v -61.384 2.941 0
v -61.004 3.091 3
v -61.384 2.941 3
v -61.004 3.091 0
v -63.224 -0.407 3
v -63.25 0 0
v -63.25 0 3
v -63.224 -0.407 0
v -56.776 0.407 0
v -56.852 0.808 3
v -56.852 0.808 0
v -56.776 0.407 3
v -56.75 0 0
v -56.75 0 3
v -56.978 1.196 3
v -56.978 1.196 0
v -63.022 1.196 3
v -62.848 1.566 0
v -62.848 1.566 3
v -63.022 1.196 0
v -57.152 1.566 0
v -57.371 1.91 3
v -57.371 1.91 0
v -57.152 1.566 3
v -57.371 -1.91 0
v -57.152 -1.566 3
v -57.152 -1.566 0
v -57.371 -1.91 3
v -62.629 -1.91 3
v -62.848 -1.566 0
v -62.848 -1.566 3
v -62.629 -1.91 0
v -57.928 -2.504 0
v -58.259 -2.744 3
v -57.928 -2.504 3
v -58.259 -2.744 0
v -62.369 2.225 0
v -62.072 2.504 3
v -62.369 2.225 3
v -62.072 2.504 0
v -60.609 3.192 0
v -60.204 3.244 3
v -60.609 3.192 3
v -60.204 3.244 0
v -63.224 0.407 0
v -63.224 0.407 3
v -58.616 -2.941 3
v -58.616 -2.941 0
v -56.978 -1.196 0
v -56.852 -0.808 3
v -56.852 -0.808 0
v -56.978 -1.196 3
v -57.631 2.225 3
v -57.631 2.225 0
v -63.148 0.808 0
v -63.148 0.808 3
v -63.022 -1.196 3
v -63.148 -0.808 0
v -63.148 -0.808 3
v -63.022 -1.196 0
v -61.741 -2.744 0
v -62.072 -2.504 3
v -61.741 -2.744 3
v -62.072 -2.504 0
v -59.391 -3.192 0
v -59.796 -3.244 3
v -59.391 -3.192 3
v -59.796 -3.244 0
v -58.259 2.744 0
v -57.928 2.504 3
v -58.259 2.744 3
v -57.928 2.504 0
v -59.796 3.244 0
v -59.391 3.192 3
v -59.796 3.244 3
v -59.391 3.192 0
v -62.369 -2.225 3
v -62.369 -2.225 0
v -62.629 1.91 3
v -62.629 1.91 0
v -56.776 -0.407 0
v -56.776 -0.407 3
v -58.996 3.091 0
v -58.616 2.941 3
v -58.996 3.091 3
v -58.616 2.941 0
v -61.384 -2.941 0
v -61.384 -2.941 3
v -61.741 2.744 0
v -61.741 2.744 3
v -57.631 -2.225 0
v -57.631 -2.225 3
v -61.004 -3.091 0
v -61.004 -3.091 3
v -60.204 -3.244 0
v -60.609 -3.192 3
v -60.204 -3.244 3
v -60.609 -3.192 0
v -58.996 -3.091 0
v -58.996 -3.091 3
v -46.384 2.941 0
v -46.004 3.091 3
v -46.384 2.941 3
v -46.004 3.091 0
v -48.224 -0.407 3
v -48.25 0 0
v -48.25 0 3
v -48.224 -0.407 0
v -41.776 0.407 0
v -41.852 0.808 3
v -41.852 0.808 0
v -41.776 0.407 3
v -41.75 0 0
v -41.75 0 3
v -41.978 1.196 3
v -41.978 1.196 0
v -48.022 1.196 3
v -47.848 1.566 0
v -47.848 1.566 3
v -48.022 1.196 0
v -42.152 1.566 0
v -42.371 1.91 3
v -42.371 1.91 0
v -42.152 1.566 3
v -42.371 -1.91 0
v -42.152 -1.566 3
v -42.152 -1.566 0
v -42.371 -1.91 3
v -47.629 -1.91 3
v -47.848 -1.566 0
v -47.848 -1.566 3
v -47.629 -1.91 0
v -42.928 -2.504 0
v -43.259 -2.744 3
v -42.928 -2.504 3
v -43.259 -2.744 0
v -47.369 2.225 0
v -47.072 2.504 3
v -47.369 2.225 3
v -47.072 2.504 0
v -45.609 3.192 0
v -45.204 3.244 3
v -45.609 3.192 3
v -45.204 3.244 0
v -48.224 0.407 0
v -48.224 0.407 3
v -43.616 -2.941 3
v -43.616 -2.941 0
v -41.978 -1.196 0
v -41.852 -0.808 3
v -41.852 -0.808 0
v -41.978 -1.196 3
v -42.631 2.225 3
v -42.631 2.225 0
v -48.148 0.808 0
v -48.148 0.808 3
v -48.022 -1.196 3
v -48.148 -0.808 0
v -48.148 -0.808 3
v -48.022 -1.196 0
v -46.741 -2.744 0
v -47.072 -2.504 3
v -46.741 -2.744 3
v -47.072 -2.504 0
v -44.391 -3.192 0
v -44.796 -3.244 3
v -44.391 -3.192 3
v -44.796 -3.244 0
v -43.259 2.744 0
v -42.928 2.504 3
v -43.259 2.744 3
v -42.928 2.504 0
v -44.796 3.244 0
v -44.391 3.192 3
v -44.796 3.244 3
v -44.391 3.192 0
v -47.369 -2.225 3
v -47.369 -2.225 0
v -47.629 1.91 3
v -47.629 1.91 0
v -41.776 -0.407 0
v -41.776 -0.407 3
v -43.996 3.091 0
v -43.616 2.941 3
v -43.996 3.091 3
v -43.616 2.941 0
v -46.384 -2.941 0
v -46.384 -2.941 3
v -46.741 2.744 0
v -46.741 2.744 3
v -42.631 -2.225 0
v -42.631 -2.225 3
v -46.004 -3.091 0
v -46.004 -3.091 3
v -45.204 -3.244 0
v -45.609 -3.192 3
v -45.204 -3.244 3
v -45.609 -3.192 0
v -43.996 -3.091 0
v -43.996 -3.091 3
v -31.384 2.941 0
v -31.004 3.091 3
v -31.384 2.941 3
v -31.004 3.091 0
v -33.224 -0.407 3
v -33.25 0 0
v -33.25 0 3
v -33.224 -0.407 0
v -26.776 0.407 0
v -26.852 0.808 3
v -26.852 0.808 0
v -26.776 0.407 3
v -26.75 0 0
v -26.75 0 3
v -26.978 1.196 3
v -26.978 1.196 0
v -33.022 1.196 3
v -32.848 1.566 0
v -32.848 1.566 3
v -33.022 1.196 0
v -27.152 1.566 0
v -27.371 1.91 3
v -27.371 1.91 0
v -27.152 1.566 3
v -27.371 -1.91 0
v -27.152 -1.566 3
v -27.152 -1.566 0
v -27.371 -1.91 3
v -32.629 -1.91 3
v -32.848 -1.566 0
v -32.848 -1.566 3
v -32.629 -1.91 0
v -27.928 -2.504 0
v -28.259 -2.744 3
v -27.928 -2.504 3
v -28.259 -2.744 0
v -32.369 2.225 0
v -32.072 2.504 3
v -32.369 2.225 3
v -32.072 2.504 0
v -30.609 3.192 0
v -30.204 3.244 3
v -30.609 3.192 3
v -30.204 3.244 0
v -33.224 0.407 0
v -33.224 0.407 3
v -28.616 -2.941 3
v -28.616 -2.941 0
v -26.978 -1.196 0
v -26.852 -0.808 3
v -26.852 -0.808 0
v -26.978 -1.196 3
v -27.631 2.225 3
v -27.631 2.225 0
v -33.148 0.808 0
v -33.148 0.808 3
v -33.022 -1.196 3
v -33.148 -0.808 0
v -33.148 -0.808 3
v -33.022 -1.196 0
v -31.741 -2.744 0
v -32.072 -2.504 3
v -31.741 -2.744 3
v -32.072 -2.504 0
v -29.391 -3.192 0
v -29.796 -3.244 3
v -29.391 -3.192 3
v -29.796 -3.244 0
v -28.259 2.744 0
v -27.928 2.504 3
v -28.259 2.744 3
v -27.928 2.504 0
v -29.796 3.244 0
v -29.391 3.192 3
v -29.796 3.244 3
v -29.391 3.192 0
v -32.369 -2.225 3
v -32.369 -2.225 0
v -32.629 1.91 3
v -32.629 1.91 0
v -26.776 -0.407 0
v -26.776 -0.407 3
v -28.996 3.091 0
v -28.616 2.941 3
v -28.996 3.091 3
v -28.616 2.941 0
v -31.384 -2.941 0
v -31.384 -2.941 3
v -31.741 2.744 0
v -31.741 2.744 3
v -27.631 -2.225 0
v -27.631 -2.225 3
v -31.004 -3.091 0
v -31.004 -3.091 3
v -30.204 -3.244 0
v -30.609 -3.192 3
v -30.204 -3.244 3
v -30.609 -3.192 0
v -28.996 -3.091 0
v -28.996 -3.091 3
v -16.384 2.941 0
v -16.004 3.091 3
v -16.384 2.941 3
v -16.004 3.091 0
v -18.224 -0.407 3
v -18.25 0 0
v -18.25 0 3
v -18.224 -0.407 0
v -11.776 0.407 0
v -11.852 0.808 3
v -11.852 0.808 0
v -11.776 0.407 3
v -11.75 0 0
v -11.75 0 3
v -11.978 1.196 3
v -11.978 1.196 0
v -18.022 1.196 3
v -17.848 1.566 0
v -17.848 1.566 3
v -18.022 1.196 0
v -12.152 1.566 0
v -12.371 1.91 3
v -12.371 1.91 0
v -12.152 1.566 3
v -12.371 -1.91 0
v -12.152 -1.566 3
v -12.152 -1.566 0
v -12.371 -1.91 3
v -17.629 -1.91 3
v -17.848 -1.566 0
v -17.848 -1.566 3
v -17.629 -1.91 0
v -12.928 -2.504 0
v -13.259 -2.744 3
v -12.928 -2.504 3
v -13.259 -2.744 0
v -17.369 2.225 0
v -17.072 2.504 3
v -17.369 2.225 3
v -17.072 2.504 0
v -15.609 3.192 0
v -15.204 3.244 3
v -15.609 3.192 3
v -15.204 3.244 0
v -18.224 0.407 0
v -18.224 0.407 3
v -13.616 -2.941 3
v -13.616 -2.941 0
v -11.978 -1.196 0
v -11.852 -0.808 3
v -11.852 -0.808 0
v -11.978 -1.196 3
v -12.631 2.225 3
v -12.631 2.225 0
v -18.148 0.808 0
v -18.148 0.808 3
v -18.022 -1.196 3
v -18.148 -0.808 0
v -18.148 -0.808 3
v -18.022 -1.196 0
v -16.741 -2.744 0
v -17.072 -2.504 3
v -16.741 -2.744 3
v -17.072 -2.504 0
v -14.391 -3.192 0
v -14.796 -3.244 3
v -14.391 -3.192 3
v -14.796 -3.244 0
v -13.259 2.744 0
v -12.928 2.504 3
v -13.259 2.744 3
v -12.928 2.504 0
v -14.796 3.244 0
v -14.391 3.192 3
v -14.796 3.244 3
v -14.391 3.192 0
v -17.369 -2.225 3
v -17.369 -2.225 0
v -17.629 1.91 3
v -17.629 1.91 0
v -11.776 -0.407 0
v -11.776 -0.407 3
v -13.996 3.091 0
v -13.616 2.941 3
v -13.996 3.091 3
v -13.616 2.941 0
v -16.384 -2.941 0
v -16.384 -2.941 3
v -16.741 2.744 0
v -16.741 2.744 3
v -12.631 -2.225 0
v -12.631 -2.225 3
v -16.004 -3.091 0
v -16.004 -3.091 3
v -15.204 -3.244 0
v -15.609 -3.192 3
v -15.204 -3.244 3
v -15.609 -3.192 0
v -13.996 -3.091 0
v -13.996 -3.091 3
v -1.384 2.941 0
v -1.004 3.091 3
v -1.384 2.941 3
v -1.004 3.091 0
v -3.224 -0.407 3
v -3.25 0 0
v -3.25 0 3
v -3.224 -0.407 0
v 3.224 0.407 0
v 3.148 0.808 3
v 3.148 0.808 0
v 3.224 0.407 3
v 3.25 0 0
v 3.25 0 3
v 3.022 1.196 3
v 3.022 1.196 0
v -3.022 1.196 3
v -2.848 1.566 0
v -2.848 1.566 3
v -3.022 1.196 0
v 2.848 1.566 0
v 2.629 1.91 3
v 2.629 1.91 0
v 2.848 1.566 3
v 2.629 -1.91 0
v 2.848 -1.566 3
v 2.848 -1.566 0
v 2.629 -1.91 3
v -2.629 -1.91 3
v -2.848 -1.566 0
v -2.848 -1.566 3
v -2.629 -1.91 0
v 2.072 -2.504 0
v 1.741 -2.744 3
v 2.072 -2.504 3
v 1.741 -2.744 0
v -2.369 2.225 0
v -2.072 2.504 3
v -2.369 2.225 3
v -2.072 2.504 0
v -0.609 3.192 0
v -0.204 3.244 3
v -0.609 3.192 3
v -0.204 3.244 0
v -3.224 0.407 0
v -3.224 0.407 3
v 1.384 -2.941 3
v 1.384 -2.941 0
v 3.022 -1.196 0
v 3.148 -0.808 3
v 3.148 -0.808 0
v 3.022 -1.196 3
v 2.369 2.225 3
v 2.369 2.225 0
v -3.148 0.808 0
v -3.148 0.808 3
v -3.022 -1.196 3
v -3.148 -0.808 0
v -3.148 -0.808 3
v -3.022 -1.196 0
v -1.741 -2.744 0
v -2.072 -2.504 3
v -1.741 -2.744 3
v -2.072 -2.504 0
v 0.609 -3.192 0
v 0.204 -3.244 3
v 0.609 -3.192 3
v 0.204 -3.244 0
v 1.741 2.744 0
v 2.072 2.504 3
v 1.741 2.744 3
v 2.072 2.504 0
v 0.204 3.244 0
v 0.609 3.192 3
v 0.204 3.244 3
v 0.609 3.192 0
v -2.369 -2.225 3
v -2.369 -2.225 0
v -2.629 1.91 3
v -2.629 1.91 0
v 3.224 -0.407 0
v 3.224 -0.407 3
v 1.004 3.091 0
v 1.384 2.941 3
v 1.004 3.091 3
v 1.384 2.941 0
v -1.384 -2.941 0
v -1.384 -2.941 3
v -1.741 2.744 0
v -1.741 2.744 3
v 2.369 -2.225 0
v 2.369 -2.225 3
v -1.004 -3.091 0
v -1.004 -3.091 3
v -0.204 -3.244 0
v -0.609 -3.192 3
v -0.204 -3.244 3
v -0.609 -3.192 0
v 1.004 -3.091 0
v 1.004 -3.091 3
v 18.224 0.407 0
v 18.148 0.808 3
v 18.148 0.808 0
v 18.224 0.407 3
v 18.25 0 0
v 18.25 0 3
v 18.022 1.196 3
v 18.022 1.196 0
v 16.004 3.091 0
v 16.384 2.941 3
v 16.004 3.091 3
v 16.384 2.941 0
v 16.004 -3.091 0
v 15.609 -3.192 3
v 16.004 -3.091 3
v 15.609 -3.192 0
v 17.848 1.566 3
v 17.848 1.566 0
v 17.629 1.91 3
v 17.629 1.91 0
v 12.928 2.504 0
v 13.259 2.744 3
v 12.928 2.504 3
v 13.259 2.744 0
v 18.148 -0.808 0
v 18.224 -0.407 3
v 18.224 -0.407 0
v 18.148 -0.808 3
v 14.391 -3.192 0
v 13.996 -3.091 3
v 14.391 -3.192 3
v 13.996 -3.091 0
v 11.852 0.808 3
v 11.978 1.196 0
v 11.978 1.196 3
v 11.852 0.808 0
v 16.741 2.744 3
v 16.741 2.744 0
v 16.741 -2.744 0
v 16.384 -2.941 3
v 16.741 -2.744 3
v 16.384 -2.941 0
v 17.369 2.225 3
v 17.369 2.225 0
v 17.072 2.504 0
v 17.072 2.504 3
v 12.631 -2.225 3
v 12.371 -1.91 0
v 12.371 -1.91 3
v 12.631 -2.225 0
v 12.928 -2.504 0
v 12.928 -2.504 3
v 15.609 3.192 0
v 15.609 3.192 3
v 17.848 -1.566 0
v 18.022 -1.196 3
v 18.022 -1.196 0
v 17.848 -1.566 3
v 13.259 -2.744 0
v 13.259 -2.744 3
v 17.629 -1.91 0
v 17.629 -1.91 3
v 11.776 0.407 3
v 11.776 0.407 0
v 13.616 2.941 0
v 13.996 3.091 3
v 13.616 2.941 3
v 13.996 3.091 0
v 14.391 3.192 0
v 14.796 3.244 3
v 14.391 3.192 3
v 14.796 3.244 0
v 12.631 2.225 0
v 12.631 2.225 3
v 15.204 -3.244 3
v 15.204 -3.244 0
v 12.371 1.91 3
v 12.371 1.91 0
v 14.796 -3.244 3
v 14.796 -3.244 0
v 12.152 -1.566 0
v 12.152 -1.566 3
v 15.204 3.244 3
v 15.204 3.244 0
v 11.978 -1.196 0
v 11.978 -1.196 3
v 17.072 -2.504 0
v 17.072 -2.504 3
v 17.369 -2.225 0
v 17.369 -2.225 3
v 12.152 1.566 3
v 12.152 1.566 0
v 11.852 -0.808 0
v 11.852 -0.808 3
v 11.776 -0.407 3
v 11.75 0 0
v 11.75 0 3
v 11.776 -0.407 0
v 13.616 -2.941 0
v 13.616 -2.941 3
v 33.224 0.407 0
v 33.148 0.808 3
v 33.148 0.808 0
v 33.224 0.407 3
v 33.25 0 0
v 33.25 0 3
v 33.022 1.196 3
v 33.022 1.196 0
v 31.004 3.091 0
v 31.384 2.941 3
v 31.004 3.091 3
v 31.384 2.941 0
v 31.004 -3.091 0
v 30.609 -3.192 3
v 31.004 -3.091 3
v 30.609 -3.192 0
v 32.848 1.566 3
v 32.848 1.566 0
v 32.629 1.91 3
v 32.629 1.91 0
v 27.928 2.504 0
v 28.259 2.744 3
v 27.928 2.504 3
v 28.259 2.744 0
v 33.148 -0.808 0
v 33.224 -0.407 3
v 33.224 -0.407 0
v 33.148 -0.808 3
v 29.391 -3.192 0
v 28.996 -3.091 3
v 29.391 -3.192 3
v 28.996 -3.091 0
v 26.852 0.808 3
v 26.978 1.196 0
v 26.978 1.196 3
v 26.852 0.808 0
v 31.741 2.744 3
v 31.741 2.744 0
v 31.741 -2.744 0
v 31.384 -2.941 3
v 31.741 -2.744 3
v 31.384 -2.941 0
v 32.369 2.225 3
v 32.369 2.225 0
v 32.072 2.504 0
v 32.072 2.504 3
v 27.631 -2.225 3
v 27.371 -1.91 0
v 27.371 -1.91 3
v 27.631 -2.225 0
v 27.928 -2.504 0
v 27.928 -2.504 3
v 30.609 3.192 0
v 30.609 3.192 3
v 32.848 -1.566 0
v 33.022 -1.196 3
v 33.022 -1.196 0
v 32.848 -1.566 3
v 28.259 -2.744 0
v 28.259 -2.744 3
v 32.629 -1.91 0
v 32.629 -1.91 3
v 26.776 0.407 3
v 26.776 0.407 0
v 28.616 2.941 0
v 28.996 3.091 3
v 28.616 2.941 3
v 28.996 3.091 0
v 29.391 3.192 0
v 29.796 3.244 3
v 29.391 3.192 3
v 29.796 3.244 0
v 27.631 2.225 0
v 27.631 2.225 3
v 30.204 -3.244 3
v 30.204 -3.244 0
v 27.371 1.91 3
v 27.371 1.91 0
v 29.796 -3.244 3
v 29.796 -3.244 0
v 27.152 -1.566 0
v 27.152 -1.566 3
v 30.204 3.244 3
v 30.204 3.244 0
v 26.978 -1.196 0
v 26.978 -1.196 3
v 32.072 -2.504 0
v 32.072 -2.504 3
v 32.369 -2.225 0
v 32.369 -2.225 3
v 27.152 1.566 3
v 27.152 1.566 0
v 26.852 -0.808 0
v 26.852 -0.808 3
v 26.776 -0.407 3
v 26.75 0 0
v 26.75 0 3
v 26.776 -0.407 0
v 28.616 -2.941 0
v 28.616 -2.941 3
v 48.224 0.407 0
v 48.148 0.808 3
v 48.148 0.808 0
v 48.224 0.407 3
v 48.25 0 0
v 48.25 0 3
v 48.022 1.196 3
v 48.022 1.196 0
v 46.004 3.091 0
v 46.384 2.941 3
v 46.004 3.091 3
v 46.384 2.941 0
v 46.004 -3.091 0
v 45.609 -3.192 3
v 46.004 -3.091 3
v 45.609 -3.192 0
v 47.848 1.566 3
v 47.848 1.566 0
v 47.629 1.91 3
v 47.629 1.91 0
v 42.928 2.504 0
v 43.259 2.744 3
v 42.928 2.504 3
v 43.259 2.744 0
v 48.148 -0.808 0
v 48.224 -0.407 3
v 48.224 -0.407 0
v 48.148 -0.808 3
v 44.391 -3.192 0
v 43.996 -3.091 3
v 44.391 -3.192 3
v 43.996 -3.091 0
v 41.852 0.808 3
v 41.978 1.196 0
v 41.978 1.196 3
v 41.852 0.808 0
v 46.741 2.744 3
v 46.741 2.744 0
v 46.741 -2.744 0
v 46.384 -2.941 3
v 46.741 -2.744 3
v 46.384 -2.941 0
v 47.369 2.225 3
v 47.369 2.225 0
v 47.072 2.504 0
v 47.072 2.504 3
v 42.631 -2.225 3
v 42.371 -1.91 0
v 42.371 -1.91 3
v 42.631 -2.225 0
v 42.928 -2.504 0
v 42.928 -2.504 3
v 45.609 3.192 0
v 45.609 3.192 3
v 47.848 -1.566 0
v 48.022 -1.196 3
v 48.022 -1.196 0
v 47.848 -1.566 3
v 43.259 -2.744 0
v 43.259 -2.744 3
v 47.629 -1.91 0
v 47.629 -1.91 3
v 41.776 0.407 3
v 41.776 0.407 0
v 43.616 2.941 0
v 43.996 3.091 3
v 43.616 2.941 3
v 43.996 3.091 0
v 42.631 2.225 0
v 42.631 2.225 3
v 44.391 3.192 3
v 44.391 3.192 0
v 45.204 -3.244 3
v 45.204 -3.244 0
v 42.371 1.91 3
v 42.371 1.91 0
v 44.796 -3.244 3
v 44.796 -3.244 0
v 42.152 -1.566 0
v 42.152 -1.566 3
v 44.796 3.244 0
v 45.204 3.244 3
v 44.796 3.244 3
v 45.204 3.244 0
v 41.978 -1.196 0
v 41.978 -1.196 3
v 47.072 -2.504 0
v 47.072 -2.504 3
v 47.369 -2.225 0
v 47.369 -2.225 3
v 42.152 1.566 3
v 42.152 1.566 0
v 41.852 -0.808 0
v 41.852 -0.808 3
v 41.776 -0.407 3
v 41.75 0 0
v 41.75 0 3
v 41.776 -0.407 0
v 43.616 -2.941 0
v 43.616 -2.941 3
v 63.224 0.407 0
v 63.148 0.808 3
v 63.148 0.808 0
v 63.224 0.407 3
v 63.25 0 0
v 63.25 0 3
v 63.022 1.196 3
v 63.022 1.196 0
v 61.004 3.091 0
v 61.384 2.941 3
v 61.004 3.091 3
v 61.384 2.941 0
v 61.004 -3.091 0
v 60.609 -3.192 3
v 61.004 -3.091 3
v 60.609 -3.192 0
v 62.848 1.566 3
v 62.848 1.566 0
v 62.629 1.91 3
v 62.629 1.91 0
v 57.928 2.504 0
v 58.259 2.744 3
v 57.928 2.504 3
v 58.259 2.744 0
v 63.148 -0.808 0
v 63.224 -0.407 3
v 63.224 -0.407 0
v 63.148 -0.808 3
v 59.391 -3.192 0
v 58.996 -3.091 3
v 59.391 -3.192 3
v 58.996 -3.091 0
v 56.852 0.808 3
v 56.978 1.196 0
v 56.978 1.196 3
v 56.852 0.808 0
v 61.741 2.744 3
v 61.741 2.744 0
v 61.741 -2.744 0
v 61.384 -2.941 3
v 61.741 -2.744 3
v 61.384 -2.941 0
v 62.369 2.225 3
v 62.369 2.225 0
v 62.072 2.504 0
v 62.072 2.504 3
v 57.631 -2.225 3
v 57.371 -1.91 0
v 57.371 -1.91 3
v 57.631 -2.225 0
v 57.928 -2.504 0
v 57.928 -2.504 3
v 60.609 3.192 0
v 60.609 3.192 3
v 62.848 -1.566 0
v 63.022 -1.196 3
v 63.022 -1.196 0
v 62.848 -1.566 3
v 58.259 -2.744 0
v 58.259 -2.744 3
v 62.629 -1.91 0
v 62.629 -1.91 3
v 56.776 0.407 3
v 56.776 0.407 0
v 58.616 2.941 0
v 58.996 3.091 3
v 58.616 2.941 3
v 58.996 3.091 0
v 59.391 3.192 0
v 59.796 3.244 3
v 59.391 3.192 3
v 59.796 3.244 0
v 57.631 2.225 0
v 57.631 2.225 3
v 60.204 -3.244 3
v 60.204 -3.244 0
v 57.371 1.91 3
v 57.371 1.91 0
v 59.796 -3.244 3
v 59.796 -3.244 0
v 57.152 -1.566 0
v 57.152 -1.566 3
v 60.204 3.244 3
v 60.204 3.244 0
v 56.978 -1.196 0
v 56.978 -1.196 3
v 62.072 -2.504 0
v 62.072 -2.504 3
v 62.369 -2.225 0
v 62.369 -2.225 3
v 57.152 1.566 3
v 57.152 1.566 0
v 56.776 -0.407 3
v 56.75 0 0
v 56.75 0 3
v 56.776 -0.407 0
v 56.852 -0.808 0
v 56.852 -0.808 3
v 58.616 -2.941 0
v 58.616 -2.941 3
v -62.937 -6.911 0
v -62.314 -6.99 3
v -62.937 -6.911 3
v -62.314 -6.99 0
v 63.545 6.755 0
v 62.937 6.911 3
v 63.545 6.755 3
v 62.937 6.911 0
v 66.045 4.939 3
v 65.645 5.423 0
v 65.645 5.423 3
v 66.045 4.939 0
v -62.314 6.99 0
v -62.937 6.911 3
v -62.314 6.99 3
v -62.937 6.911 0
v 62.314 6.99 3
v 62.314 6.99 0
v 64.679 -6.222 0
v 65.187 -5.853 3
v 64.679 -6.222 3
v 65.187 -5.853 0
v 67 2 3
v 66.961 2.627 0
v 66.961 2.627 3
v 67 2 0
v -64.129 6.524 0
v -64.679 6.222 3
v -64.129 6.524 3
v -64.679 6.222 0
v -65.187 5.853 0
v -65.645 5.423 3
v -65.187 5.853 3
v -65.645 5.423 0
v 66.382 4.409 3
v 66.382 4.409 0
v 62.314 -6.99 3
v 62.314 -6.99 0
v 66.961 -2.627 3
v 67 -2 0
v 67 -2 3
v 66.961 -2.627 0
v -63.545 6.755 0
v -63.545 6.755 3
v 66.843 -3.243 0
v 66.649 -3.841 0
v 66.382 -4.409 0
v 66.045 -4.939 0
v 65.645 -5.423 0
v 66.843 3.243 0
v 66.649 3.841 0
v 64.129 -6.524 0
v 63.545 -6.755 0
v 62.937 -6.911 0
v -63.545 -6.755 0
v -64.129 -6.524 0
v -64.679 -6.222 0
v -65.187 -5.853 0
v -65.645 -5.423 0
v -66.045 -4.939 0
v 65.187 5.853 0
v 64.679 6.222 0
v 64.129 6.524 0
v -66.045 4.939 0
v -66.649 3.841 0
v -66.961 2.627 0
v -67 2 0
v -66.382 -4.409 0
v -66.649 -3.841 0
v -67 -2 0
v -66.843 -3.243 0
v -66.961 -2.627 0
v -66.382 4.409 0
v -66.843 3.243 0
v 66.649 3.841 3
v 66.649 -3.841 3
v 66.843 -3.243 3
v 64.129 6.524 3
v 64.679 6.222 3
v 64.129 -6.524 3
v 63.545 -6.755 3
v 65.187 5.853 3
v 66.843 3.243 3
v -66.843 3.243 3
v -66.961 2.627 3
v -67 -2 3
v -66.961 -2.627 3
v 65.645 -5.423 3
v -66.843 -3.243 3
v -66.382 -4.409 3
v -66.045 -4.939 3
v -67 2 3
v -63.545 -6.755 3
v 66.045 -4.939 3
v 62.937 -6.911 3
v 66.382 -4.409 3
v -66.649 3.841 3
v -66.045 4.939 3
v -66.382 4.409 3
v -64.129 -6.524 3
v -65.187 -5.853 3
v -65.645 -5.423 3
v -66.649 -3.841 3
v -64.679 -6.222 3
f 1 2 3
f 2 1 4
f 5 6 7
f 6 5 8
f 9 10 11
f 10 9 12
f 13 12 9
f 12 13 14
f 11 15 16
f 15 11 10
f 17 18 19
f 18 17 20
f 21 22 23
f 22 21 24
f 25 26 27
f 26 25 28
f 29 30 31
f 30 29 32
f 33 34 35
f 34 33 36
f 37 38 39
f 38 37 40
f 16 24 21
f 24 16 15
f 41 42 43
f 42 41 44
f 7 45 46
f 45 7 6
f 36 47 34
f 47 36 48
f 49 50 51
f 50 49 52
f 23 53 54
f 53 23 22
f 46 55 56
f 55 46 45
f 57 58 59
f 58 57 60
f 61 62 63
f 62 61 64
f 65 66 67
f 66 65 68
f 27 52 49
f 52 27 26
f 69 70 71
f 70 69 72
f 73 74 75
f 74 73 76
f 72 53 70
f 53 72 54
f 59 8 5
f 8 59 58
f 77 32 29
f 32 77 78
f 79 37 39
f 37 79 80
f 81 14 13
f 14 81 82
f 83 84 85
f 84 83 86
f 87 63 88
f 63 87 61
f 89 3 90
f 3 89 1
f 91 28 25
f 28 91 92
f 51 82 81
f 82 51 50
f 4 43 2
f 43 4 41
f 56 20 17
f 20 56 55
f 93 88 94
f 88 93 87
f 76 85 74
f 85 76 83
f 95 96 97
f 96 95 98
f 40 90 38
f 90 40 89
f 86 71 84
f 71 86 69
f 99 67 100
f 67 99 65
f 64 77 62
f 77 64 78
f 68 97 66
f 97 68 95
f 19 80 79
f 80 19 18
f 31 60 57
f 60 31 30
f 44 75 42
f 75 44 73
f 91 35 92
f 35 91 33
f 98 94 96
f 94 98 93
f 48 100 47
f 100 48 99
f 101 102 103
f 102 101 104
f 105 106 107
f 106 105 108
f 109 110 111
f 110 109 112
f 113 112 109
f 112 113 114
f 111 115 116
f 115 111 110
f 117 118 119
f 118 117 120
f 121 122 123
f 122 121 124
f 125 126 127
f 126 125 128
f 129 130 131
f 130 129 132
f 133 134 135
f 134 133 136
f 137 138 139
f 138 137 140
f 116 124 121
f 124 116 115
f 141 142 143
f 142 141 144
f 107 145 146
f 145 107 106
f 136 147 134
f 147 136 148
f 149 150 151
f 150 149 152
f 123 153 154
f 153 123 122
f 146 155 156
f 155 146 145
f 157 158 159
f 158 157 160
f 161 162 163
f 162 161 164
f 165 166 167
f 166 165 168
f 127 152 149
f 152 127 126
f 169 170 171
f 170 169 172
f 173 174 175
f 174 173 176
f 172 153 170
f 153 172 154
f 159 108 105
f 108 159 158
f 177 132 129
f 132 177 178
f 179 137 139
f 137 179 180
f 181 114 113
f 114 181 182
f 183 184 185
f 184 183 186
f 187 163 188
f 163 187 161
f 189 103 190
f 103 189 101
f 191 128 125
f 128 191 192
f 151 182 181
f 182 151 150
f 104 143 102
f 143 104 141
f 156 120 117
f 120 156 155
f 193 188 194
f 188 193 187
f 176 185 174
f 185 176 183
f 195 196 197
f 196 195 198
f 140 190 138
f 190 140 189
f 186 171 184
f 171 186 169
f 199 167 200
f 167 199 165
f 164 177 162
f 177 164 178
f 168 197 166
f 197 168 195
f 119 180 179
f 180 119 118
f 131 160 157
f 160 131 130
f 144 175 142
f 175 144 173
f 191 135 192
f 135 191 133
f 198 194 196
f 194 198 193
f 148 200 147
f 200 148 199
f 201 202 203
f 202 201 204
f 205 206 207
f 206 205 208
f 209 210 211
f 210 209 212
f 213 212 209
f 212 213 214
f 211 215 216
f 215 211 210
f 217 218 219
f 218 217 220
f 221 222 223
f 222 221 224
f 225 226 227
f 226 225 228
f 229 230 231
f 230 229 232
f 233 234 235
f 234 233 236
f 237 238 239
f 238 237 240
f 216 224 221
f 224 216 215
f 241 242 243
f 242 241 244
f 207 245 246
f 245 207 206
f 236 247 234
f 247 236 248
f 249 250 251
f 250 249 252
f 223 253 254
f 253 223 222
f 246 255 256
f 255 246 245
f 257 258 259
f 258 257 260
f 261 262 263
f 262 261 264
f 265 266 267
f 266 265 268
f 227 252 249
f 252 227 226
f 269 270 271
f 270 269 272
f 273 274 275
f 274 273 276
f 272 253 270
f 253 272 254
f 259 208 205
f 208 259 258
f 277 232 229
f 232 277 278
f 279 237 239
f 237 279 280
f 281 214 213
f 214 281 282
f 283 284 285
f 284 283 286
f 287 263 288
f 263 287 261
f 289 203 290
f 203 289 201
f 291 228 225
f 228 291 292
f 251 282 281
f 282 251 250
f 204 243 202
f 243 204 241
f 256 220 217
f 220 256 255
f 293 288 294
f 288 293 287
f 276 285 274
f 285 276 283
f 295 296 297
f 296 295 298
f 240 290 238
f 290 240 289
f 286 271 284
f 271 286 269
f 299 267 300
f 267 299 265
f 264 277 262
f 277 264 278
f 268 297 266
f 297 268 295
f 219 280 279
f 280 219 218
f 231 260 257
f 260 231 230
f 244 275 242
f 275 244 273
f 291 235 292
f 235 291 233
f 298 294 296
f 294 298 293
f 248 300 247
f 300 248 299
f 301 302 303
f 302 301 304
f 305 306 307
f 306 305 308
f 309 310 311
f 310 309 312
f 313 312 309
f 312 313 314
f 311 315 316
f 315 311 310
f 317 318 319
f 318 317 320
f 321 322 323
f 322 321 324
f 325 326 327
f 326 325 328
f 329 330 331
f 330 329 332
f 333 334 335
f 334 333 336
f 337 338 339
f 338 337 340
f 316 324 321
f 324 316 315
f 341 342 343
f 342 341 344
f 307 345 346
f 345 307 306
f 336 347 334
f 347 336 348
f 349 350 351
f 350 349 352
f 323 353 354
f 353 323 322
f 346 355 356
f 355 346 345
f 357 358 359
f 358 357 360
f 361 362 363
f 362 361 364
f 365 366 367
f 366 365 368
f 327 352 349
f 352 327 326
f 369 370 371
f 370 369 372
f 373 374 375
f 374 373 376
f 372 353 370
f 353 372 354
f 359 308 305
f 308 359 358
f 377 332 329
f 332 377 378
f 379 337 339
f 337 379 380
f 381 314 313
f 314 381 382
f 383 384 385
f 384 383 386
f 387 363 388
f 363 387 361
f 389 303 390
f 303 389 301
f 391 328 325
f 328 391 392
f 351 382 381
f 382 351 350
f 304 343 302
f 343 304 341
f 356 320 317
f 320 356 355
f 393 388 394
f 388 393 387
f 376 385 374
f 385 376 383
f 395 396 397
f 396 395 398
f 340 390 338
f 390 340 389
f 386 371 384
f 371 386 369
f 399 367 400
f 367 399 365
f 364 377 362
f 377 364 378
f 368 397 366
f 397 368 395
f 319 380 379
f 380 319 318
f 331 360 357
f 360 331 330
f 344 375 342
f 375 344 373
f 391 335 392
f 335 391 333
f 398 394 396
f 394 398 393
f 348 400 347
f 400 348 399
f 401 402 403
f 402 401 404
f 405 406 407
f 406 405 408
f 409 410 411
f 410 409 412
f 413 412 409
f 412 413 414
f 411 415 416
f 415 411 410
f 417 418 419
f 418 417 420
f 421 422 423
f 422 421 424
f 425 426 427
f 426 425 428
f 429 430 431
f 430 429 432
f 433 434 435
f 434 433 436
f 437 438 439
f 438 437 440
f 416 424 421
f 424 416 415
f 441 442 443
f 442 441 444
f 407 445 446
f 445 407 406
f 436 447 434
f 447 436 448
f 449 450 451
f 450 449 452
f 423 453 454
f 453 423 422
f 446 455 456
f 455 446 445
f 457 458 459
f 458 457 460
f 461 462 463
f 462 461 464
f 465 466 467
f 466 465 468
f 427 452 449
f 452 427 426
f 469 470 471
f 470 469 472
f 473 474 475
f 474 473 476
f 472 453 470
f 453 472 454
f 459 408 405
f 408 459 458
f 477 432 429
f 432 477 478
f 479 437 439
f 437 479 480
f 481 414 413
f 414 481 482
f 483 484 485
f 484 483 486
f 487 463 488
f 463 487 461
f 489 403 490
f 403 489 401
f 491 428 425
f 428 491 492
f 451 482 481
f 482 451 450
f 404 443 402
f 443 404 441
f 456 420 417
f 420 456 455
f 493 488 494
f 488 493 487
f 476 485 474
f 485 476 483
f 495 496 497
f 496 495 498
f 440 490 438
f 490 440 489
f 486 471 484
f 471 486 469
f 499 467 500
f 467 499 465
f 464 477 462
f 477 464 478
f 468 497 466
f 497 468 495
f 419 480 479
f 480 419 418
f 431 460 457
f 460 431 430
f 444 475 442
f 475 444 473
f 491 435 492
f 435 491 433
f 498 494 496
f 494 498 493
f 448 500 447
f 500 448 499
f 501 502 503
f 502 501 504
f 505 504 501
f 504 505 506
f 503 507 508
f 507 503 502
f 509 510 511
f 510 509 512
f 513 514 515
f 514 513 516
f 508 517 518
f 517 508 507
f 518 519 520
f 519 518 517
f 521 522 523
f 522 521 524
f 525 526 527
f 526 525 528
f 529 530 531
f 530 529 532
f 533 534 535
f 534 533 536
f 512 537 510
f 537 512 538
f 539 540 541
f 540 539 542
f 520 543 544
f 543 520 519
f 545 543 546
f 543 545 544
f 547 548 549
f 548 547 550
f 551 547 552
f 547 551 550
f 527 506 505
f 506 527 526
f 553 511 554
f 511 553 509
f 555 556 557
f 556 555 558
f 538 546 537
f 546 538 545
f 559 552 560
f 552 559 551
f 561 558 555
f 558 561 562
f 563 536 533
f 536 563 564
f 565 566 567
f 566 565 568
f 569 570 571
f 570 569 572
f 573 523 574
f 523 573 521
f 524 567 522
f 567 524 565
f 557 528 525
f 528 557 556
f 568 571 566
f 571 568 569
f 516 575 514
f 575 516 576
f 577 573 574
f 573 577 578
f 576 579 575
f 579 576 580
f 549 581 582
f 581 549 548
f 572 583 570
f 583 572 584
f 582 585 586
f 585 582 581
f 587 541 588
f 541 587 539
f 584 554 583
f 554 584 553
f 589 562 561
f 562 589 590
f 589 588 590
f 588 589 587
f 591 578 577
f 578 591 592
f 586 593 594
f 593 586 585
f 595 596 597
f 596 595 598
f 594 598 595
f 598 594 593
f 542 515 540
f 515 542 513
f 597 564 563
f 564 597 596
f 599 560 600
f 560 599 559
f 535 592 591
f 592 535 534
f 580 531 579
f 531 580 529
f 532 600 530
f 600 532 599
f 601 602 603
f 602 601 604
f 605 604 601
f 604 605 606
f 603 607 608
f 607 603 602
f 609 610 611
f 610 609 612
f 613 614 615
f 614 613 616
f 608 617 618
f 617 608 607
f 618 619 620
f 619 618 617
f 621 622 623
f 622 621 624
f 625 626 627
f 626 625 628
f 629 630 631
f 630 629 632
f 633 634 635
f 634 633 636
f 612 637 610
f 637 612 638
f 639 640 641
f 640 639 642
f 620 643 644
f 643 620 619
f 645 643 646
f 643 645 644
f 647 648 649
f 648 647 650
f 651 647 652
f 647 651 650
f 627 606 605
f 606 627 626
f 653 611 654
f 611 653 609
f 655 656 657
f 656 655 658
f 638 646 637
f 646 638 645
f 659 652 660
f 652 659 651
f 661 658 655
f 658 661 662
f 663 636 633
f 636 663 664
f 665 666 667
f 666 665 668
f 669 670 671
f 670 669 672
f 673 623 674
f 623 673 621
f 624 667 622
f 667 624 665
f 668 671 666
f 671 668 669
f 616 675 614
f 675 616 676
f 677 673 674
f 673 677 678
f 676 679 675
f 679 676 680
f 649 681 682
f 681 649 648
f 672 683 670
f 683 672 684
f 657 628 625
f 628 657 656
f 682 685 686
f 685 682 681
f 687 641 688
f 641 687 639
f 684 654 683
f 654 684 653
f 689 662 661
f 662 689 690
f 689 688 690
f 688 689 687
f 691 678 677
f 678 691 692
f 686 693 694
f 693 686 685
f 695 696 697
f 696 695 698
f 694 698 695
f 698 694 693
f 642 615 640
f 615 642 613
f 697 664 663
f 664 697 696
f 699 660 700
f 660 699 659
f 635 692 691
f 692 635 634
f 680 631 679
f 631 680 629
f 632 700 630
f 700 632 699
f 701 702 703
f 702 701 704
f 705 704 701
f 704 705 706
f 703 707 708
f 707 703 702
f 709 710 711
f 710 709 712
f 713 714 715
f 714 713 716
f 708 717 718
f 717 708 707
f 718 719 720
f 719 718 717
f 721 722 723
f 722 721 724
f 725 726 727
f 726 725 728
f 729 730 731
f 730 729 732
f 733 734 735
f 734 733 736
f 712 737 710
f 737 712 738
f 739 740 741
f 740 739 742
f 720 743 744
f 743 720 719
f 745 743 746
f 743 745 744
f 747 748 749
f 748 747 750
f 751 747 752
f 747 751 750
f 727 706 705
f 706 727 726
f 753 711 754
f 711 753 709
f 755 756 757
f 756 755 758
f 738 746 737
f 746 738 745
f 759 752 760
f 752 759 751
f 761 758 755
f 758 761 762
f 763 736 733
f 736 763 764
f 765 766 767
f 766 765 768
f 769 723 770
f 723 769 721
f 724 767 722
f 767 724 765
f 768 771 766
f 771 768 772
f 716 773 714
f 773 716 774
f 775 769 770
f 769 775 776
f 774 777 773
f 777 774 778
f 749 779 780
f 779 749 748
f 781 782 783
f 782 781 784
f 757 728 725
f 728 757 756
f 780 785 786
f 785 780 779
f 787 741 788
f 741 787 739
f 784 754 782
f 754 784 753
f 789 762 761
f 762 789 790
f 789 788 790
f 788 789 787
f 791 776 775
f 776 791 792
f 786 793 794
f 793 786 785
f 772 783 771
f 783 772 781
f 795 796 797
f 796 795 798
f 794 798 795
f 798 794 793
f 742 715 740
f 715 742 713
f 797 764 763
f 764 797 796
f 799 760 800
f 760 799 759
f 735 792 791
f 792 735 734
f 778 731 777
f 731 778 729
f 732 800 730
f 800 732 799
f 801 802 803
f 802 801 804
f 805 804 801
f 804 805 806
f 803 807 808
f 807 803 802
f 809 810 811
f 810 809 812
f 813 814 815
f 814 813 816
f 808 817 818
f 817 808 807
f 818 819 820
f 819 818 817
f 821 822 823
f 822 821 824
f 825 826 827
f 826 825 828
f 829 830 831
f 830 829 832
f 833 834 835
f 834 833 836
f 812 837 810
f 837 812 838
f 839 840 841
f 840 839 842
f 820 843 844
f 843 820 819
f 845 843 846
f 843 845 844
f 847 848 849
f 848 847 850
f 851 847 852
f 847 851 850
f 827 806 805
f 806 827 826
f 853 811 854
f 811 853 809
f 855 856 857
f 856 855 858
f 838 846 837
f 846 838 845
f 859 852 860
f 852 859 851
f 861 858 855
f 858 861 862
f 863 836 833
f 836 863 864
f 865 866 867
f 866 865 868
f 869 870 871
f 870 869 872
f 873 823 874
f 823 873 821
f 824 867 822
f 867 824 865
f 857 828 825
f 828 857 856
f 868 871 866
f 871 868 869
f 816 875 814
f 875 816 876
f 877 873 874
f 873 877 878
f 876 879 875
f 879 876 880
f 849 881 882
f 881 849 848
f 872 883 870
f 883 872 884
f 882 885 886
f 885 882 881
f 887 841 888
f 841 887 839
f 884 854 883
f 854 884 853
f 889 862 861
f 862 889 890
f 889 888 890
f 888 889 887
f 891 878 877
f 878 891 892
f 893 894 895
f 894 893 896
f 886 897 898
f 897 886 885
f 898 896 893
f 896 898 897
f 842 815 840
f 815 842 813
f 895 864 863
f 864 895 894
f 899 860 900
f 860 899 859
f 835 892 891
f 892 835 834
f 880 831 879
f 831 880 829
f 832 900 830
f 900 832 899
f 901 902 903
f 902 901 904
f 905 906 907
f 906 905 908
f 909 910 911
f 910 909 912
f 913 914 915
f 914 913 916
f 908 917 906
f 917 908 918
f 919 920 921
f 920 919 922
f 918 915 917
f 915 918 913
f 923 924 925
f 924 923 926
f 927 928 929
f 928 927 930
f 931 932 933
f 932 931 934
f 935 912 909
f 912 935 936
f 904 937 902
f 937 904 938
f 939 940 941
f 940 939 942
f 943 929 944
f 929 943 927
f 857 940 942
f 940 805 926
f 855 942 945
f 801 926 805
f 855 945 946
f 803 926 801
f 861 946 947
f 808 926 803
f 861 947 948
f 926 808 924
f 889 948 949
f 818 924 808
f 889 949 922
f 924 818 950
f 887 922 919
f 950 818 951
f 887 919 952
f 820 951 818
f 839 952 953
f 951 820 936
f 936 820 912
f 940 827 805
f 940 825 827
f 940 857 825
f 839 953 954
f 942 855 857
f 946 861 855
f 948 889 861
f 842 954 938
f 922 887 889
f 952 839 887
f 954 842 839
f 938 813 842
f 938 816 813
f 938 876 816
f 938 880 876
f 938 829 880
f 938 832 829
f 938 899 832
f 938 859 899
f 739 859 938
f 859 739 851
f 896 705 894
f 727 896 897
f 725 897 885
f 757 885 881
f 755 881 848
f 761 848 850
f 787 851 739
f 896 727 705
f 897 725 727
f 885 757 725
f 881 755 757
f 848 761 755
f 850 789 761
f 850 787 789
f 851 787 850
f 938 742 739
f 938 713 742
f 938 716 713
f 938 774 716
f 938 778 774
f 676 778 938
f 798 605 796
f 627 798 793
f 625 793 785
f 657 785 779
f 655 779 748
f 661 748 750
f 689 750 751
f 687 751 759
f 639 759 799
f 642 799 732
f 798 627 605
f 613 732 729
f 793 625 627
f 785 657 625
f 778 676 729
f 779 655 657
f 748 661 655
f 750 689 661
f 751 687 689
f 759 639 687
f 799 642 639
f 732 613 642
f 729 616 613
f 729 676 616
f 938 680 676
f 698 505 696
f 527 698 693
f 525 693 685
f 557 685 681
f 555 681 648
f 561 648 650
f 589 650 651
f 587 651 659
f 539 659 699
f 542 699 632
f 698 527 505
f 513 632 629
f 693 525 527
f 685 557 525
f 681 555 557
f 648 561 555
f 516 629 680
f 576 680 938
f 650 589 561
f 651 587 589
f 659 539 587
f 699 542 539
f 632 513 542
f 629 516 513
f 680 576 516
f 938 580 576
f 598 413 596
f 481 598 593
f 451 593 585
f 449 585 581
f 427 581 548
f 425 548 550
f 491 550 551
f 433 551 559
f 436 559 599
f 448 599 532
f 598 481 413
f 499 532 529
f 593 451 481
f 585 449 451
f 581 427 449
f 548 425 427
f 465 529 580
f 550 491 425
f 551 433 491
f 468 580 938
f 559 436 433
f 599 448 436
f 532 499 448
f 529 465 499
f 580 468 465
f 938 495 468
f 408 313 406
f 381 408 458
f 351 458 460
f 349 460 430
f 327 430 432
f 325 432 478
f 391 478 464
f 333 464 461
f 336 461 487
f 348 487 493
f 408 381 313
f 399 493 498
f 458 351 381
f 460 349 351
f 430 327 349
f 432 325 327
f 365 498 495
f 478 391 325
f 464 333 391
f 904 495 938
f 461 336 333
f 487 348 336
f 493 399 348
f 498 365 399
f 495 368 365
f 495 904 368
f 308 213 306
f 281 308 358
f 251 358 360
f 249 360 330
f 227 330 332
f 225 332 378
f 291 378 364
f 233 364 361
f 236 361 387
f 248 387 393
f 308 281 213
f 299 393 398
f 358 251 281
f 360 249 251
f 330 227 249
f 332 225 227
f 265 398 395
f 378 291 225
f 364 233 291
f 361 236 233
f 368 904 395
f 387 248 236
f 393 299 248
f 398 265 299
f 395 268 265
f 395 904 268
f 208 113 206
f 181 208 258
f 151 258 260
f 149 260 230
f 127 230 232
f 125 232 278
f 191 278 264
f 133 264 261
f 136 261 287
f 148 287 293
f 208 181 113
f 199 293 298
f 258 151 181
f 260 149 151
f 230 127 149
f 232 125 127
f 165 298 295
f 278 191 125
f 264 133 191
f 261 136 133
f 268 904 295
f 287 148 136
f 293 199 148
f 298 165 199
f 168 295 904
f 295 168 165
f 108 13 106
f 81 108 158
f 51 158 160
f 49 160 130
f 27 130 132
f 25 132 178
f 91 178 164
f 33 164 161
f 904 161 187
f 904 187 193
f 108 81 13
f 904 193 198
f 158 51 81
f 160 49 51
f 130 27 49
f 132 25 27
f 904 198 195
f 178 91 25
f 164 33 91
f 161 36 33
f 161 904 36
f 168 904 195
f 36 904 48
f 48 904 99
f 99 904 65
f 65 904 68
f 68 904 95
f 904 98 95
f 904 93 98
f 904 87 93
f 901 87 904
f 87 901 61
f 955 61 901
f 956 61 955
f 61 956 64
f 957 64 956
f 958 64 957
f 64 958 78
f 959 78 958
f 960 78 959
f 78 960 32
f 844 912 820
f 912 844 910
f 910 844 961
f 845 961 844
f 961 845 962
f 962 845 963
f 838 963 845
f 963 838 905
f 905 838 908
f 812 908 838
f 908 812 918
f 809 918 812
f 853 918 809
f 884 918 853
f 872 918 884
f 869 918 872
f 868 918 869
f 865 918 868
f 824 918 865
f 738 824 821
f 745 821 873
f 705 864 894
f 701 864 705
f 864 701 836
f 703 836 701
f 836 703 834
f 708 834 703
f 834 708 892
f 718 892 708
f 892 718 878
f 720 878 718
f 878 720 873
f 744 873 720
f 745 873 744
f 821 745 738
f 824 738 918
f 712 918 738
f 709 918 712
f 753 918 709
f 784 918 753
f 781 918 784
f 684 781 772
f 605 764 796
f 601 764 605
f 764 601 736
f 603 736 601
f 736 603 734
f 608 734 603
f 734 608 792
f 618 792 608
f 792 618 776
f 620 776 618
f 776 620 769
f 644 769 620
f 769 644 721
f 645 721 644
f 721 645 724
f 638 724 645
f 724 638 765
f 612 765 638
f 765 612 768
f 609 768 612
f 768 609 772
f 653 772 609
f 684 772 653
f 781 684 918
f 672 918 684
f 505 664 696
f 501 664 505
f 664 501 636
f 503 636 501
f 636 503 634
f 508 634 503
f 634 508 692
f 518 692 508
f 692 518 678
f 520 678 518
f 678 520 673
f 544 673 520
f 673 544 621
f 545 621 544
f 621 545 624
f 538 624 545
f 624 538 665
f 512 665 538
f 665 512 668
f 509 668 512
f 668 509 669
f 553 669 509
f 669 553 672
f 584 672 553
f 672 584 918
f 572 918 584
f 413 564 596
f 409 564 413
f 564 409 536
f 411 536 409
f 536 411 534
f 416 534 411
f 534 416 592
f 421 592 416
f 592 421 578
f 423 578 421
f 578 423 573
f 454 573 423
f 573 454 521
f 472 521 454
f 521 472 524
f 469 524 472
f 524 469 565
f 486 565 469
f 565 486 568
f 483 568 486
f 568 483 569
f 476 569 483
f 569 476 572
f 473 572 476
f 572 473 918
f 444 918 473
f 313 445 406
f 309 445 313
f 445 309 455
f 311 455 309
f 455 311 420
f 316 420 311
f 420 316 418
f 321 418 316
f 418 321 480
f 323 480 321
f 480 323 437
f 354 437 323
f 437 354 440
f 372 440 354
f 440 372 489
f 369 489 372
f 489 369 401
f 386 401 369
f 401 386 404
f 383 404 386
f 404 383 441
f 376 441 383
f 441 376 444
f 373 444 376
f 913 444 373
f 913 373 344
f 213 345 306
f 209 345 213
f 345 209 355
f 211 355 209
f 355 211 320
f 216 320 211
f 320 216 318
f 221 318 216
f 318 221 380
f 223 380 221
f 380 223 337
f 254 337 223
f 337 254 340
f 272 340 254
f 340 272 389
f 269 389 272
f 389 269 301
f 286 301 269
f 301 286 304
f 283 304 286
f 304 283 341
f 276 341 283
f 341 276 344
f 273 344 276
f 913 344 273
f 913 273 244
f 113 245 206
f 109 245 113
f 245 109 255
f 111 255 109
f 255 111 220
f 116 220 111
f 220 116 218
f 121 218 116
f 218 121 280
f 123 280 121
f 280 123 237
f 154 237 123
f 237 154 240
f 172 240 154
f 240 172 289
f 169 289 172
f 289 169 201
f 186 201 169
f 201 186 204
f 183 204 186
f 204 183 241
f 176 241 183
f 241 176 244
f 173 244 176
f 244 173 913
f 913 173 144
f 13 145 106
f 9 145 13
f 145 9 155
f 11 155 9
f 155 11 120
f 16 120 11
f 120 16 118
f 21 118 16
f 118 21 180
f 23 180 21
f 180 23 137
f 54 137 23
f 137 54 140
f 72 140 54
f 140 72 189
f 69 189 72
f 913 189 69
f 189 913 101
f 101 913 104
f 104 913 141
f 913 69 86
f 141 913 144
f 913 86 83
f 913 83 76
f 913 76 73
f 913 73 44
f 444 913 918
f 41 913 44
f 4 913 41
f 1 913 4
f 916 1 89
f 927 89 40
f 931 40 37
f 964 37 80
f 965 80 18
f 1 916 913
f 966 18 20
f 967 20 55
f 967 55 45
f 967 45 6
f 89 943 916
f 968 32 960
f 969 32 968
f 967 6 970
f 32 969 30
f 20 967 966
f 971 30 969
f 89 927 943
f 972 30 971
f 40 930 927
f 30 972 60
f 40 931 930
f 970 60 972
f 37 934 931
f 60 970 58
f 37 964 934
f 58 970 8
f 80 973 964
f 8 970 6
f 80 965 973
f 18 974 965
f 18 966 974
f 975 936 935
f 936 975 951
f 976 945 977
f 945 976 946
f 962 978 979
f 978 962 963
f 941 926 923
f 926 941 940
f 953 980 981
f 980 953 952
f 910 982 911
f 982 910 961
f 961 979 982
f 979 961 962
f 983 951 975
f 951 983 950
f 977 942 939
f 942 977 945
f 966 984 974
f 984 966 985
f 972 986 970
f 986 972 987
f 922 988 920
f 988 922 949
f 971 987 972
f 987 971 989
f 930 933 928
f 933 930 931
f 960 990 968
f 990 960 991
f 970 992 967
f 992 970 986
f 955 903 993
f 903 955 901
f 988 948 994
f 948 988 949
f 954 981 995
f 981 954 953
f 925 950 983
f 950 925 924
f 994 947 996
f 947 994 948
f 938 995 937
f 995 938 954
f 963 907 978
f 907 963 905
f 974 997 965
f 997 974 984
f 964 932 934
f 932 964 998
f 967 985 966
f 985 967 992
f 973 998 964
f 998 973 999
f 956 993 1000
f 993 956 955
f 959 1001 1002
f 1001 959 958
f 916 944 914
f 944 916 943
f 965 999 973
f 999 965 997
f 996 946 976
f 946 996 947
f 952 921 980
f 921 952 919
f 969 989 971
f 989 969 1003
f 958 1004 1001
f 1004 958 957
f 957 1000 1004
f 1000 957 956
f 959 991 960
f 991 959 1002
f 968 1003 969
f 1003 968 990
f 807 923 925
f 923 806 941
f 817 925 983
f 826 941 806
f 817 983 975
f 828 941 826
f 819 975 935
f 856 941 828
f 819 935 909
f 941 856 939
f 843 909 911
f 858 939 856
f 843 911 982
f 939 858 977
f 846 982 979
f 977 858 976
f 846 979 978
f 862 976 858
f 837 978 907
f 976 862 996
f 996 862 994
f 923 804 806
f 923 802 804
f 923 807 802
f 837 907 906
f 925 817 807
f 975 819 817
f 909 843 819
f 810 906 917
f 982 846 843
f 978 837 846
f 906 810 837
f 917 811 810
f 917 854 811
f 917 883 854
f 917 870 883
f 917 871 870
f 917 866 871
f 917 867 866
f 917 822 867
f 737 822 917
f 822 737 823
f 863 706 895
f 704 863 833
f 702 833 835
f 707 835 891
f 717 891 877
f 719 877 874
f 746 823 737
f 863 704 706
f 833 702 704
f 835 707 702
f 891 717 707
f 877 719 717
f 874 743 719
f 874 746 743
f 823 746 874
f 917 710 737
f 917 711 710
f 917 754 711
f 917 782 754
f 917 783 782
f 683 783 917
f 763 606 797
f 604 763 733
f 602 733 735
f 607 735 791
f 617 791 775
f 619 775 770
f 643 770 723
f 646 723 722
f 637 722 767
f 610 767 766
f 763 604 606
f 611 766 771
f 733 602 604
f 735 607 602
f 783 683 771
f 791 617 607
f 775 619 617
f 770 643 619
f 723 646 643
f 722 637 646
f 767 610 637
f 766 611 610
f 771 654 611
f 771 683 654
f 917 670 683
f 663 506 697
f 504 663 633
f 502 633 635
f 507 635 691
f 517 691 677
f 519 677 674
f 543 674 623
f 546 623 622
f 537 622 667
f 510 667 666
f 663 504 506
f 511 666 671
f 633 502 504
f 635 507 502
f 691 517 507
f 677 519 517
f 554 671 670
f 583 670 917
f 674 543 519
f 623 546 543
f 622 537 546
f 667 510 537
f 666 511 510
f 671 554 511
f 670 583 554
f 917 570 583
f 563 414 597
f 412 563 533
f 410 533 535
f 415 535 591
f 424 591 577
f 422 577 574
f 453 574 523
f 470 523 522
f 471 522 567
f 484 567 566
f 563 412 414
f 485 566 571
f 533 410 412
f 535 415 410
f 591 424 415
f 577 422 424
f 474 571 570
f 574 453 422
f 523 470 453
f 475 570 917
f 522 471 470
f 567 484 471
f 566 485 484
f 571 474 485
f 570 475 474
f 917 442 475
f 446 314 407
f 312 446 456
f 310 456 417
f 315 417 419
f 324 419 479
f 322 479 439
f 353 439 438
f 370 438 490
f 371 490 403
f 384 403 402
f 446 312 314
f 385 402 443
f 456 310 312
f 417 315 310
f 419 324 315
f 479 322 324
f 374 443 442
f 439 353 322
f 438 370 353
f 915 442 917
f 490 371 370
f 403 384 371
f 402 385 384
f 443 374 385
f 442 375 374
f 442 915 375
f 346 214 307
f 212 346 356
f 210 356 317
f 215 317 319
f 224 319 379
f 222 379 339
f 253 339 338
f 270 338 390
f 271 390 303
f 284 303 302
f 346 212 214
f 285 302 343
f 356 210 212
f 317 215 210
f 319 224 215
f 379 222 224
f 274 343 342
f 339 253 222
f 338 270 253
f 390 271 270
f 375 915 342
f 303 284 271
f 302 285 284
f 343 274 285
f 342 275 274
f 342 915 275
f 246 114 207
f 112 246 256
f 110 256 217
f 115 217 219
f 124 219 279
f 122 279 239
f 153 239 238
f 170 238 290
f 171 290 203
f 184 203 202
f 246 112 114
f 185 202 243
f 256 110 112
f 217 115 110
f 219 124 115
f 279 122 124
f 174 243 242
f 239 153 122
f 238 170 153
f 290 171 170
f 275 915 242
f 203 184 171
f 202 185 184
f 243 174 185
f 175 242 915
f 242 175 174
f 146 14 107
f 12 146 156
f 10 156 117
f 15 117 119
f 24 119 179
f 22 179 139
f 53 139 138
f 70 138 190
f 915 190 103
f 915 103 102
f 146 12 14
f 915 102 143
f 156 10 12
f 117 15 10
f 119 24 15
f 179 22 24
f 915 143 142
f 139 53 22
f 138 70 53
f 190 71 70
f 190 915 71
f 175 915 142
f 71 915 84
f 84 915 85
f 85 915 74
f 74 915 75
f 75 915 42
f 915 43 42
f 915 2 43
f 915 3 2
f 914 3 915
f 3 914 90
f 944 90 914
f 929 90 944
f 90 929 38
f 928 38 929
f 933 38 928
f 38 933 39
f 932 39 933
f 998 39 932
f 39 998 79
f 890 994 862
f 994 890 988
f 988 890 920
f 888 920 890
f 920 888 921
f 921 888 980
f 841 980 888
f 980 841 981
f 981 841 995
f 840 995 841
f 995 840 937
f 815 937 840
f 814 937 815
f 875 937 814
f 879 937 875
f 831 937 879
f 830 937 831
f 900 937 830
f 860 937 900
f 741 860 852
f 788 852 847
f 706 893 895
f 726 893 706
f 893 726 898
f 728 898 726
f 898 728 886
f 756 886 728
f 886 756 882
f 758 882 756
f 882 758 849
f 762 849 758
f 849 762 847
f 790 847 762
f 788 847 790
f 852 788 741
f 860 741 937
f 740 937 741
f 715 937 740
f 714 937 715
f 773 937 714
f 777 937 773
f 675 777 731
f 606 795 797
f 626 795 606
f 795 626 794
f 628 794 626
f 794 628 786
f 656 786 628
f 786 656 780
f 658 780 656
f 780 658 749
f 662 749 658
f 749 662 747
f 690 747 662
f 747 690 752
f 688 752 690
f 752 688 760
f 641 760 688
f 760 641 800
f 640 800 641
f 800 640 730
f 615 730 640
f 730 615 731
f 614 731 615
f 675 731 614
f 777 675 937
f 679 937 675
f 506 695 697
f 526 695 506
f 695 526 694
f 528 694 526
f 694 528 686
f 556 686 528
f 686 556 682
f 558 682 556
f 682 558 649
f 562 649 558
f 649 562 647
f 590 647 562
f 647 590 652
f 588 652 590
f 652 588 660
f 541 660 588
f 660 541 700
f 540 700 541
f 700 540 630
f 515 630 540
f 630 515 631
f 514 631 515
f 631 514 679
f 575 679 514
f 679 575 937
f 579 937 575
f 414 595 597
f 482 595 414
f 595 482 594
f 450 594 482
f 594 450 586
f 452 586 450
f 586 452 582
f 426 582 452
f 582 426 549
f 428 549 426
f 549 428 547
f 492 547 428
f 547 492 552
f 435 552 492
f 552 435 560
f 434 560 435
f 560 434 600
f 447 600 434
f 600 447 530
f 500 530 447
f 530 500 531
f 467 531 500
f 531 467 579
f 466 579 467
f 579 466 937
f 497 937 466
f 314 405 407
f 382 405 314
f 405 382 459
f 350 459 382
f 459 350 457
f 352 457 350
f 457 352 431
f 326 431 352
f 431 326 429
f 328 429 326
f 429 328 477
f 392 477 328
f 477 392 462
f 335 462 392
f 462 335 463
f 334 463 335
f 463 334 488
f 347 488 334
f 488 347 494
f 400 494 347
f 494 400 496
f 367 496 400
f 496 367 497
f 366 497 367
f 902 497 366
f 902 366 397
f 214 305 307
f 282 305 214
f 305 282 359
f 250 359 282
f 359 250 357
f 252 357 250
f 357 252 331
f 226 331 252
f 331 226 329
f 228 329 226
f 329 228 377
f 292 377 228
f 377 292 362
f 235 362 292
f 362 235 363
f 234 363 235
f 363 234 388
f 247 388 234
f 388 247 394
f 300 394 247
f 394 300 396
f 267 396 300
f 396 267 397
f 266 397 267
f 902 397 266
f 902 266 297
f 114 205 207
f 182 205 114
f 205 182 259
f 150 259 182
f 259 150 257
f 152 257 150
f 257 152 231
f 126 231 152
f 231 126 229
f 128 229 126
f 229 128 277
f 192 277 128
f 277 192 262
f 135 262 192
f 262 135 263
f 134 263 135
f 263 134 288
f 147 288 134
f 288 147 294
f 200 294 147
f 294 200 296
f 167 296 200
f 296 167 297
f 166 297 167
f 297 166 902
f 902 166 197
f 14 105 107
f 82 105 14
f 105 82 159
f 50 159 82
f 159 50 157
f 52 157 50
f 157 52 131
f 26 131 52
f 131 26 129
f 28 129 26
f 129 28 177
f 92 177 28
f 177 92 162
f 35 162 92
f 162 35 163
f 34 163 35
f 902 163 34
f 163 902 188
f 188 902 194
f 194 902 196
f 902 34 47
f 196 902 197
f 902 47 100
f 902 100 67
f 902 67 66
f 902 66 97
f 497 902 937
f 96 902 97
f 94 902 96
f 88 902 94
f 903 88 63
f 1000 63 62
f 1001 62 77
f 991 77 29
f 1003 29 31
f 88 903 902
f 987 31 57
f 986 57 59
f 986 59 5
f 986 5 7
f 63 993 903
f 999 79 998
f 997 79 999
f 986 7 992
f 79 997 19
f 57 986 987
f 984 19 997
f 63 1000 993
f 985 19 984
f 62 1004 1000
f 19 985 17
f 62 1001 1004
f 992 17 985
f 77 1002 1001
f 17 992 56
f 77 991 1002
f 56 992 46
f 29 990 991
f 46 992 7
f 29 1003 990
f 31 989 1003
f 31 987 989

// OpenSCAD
$fn = 50;


difference() {
	union() {
		hull() {
			translate(v = [-62.0000000000, 2.0000000000, 0]) {
				cylinder(h = 3, r = 5);
			}
			translate(v = [62.0000000000, 2.0000000000, 0]) {
				cylinder(h = 3, r = 5);
			}
			translate(v = [-62.0000000000, -2.0000000000, 0]) {
				cylinder(h = 3, r = 5);
			}
			translate(v = [62.0000000000, -2.0000000000, 0]) {
				cylinder(h = 3, r = 5);
			}
		}
	}
	union() {
		translate(v = [-60.0000000000, 0.0000000000, 0]) {
			translate(v = [0, 0, -100]) {
				cylinder(h = 200, r = 3.2500000000);
			}
		}
		translate(v = [-45.0000000000, 0.0000000000, 0]) {
			translate(v = [0, 0, -100]) {
				cylinder(h = 200, r = 3.2500000000);
			}
		}
		translate(v = [-30.0000000000, 0.0000000000, 0]) {
			translate(v = [0, 0, -100]) {
				cylinder(h = 200, r = 3.2500000000);
			}
		}
		translate(v = [-15.0000000000, 0.0000000000, 0]) {
			translate(v = [0, 0, -100]) {
				cylinder(h = 200, r = 3.2500000000);
			}
		}
		translate(v = [0, 0, -100]) {
			cylinder(h = 200, r = 3.2500000000);
		}
		translate(v = [15.0000000000, 0.0000000000, 0]) {
			translate(v = [0, 0, -100]) {
				cylinder(h = 200, r = 3.2500000000);
			}
		}
		translate(v = [30.0000000000, 0.0000000000, 0]) {
			translate(v = [0, 0, -100]) {
				cylinder(h = 200, r = 3.2500000000);
			}
		}
		translate(v = [45.0000000000, 0.0000000000, 0]) {
			translate(v = [0, 0, -100]) {
				cylinder(h = 200, r = 3.2500000000);
			}
		}
		translate(v = [60.0000000000, 0.0000000000, 0]) {
			translate(v = [0, 0, -100]) {
				cylinder(h = 200, r = 3.2500000000);
			}
		}
	}
}
